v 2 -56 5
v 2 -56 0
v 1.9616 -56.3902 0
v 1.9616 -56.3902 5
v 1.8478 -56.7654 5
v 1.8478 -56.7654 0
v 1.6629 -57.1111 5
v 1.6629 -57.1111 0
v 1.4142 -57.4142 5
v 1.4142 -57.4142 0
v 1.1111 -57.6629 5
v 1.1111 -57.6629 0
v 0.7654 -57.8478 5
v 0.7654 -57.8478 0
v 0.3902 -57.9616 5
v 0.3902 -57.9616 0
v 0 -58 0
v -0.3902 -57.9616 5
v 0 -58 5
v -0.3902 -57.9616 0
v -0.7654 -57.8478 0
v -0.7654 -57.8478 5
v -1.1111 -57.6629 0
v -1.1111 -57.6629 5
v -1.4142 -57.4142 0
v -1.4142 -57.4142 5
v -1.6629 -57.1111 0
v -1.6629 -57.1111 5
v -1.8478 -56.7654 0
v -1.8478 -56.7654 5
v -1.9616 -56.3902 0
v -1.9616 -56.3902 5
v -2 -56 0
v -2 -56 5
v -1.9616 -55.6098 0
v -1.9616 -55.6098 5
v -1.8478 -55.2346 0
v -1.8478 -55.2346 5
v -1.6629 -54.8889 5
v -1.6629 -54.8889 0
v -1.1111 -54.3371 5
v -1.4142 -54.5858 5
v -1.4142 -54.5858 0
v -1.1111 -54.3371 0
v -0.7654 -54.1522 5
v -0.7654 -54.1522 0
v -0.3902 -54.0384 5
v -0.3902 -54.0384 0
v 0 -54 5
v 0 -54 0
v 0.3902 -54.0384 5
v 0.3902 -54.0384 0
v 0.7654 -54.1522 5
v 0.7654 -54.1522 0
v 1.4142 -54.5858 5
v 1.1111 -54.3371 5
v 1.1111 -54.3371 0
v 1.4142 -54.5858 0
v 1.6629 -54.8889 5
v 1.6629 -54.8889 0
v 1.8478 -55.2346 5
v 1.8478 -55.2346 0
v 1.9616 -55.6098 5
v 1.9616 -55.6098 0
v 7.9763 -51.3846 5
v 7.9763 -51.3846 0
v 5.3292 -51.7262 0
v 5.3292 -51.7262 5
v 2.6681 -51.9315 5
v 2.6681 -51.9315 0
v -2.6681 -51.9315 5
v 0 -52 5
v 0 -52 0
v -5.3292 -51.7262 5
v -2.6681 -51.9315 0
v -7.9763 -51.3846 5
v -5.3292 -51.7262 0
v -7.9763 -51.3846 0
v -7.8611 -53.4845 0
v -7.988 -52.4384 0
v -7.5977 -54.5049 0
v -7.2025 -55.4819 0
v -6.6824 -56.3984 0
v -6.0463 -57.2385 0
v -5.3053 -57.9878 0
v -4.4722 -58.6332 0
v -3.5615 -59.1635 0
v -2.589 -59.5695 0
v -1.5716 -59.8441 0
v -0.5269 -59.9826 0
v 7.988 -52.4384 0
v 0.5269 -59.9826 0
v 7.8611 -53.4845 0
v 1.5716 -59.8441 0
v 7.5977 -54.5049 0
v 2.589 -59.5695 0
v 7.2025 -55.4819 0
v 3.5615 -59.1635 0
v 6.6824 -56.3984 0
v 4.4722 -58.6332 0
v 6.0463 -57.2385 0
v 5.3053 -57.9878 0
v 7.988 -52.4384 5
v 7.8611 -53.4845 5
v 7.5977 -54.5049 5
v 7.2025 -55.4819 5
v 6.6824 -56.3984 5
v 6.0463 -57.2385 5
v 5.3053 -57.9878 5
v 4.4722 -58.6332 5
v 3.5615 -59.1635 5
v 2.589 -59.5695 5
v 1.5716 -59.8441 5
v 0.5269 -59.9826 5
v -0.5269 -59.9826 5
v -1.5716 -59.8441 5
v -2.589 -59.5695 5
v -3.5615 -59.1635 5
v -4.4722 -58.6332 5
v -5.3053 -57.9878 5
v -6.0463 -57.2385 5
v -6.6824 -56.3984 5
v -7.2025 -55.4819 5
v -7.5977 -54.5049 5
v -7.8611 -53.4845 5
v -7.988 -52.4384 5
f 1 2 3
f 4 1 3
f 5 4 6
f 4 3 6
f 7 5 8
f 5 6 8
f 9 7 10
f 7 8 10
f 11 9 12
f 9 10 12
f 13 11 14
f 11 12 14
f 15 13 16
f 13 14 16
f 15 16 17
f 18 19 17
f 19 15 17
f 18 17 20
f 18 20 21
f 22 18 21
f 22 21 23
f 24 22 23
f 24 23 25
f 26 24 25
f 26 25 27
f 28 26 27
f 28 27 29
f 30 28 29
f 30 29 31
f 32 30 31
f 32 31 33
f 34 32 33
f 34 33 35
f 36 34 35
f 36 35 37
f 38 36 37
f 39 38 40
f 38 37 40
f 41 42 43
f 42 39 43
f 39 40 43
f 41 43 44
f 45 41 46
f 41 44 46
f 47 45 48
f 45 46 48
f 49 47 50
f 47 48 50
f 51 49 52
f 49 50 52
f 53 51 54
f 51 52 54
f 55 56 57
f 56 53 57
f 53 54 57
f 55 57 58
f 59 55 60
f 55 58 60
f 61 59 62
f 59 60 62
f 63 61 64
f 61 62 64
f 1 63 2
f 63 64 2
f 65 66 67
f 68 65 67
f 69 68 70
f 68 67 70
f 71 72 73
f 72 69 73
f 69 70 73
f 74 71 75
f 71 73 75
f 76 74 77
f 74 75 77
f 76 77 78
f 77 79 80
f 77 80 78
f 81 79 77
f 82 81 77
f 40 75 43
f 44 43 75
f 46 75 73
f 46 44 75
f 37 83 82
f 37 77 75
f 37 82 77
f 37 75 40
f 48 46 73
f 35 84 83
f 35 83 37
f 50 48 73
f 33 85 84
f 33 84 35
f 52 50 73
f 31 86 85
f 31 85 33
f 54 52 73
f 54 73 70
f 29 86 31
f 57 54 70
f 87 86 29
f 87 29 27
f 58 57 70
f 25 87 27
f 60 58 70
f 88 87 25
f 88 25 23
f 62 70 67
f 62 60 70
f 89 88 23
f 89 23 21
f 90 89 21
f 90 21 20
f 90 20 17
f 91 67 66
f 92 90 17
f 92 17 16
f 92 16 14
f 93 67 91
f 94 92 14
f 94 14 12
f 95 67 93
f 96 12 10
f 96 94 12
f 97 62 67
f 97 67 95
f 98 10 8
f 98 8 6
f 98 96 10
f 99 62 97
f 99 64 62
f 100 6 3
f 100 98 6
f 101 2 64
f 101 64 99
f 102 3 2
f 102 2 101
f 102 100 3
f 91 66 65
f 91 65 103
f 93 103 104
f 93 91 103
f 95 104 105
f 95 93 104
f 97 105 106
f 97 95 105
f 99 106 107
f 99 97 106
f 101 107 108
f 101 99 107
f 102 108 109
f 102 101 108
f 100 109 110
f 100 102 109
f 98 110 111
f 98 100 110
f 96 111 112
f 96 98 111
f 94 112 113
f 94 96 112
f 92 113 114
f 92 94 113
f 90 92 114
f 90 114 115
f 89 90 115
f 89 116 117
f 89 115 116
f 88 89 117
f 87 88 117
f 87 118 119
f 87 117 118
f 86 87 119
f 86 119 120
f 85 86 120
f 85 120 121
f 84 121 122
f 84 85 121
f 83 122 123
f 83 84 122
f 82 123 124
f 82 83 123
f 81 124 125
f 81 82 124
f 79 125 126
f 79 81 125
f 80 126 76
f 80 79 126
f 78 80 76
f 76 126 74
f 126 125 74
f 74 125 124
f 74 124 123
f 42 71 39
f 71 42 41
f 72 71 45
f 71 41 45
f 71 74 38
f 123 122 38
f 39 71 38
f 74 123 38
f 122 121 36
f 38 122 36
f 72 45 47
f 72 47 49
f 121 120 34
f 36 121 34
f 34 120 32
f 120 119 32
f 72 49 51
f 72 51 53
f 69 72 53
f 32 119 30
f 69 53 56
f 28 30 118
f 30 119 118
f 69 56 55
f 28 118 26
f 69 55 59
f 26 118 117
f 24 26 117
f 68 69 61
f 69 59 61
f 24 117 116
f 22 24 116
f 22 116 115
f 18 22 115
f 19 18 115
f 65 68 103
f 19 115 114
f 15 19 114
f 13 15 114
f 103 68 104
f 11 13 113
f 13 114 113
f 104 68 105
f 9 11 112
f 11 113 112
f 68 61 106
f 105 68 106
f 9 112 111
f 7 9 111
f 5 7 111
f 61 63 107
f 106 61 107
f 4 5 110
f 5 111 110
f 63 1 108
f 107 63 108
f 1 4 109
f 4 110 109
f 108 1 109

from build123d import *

# Parameters (mm, degrees)
CYLINDER005_R     = 2
CYLINDER005_DEPTH = 6
CYLINDER004_R     = 52
CYLINDER004_DEPTH = 67
CYLINDER003_R     = 8
CYLINDER003_DEPTH = 5


with BuildPart() as screw_cut:
    # Cylinder005 → Cylinder005 (new body)
    with BuildSketch(Plane(origin=(0, 56, -0.5), x_dir=(1, 0, 0), z_dir=(0, 0, 1))):
        Circle(CYLINDER005_R)
    extrude(amount=CYLINDER005_DEPTH)


with BuildPart() as cylinder:
    # Cylinder004 → Cylinder004 (new body)
    with BuildSketch(Plane.XY):
        Circle(CYLINDER004_R)
    extrude(amount=CYLINDER004_DEPTH)


with BuildPart() as hinge_final:
    # Cylinder003 → Cylinder003 (new body)
    with BuildSketch(Plane(origin=(0, 52, 0), x_dir=(1, 0, 0), z_dir=(0, 0, 1))):
        Circle(CYLINDER003_R)
    extrude(amount=CYLINDER003_DEPTH)

    # Cut002: cut Cylinder
    add(cylinder.part, mode=Mode.SUBTRACT)

    # Cut003: cut Screw Cut
    add(screw_cut.part, mode=Mode.SUBTRACT)


with BuildPart() as part_mirroring:
    # Part__Mirroring: instance of Hinge Final
    add(hinge_final.part.mirror(Plane(origin=(0.001259, 0, 2.5), x_dir=(1, 0, 0), z_dir=(0, 1, 0))))


solid = part_mirroring.part
